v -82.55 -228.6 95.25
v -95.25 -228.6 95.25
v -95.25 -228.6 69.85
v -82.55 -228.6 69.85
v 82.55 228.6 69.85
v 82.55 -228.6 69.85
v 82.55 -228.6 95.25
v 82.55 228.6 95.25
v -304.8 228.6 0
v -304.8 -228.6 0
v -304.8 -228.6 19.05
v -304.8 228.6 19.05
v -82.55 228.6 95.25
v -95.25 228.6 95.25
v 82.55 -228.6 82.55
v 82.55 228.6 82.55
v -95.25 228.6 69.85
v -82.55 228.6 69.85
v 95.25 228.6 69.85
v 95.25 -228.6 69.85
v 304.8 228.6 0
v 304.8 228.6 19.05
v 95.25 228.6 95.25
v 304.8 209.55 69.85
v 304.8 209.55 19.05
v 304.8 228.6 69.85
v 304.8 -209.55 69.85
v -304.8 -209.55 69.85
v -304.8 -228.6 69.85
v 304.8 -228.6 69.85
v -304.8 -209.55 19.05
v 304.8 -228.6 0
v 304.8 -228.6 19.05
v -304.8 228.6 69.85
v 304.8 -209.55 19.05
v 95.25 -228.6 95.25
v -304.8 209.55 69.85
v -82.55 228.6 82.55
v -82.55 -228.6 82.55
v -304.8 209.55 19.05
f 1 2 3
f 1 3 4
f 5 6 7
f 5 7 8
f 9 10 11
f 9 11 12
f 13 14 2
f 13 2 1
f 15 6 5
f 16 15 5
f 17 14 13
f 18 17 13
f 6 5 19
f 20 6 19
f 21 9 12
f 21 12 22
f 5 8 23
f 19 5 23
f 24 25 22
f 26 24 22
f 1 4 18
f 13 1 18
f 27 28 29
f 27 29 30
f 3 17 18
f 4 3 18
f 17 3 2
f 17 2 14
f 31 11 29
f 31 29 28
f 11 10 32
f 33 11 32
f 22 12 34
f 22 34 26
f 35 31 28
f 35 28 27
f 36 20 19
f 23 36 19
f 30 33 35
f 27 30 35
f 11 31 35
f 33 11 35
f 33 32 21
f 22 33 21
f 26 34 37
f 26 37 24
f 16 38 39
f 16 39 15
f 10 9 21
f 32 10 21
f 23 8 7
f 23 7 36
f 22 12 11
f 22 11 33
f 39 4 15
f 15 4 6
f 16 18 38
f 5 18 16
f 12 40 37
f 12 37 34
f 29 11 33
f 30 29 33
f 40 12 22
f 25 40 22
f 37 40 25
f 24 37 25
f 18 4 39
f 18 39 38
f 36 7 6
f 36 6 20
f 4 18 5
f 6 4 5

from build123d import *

# Parameters (mm, degrees)
F0_W     = 609.6
F0_H     = 457.2
F1_DEPTH = 19.05
F2_W     = 609.6
F2_H     = 19.05
F3_DEPTH = 50.8
F4_W     = 165.1
F4_H     = 457.2
F5_DEPTH = 12.7
F6_W     = 12.7
F6_H     = 457.2
F7_DEPTH = 25.4


with BuildPart() as f1:
    # F0 (on Top) → F1 (new body)
    with BuildSketch(Plane.XY):
        Rectangle(F0_W, F0_H)
    extrude(amount=F1_DEPTH)


with BuildPart() as f3:
    # F2 (on face) → F3 (new body)
    with BuildSketch(Plane.XY.offset(19.05)):
        with Locations((0, 219.075)):
            Rectangle(F2_W, F2_H)
        with Locations((0, -219.075)):
            Rectangle(F2_W, F2_H)
    extrude(amount=F3_DEPTH)


with BuildPart() as f5:
    # F4 (on face) → F5 (new body)
    with BuildSketch(Plane.XY.offset(69.85)):
        Rectangle(F4_W, F4_H)
    extrude(amount=F5_DEPTH)


with BuildPart() as f7:
    # F6 (on face) → F7 (new body)
    with BuildSketch(Plane.XY.offset(69.85)):
        with Locations((-88.9, 0)):
            Rectangle(F6_W, F6_H)
        with Locations((88.9, 0)):
            Rectangle(F6_W, F6_H)
    extrude(amount=F7_DEPTH)


solid = Compound([f1.part, f3.part, f5.part, f7.part])
